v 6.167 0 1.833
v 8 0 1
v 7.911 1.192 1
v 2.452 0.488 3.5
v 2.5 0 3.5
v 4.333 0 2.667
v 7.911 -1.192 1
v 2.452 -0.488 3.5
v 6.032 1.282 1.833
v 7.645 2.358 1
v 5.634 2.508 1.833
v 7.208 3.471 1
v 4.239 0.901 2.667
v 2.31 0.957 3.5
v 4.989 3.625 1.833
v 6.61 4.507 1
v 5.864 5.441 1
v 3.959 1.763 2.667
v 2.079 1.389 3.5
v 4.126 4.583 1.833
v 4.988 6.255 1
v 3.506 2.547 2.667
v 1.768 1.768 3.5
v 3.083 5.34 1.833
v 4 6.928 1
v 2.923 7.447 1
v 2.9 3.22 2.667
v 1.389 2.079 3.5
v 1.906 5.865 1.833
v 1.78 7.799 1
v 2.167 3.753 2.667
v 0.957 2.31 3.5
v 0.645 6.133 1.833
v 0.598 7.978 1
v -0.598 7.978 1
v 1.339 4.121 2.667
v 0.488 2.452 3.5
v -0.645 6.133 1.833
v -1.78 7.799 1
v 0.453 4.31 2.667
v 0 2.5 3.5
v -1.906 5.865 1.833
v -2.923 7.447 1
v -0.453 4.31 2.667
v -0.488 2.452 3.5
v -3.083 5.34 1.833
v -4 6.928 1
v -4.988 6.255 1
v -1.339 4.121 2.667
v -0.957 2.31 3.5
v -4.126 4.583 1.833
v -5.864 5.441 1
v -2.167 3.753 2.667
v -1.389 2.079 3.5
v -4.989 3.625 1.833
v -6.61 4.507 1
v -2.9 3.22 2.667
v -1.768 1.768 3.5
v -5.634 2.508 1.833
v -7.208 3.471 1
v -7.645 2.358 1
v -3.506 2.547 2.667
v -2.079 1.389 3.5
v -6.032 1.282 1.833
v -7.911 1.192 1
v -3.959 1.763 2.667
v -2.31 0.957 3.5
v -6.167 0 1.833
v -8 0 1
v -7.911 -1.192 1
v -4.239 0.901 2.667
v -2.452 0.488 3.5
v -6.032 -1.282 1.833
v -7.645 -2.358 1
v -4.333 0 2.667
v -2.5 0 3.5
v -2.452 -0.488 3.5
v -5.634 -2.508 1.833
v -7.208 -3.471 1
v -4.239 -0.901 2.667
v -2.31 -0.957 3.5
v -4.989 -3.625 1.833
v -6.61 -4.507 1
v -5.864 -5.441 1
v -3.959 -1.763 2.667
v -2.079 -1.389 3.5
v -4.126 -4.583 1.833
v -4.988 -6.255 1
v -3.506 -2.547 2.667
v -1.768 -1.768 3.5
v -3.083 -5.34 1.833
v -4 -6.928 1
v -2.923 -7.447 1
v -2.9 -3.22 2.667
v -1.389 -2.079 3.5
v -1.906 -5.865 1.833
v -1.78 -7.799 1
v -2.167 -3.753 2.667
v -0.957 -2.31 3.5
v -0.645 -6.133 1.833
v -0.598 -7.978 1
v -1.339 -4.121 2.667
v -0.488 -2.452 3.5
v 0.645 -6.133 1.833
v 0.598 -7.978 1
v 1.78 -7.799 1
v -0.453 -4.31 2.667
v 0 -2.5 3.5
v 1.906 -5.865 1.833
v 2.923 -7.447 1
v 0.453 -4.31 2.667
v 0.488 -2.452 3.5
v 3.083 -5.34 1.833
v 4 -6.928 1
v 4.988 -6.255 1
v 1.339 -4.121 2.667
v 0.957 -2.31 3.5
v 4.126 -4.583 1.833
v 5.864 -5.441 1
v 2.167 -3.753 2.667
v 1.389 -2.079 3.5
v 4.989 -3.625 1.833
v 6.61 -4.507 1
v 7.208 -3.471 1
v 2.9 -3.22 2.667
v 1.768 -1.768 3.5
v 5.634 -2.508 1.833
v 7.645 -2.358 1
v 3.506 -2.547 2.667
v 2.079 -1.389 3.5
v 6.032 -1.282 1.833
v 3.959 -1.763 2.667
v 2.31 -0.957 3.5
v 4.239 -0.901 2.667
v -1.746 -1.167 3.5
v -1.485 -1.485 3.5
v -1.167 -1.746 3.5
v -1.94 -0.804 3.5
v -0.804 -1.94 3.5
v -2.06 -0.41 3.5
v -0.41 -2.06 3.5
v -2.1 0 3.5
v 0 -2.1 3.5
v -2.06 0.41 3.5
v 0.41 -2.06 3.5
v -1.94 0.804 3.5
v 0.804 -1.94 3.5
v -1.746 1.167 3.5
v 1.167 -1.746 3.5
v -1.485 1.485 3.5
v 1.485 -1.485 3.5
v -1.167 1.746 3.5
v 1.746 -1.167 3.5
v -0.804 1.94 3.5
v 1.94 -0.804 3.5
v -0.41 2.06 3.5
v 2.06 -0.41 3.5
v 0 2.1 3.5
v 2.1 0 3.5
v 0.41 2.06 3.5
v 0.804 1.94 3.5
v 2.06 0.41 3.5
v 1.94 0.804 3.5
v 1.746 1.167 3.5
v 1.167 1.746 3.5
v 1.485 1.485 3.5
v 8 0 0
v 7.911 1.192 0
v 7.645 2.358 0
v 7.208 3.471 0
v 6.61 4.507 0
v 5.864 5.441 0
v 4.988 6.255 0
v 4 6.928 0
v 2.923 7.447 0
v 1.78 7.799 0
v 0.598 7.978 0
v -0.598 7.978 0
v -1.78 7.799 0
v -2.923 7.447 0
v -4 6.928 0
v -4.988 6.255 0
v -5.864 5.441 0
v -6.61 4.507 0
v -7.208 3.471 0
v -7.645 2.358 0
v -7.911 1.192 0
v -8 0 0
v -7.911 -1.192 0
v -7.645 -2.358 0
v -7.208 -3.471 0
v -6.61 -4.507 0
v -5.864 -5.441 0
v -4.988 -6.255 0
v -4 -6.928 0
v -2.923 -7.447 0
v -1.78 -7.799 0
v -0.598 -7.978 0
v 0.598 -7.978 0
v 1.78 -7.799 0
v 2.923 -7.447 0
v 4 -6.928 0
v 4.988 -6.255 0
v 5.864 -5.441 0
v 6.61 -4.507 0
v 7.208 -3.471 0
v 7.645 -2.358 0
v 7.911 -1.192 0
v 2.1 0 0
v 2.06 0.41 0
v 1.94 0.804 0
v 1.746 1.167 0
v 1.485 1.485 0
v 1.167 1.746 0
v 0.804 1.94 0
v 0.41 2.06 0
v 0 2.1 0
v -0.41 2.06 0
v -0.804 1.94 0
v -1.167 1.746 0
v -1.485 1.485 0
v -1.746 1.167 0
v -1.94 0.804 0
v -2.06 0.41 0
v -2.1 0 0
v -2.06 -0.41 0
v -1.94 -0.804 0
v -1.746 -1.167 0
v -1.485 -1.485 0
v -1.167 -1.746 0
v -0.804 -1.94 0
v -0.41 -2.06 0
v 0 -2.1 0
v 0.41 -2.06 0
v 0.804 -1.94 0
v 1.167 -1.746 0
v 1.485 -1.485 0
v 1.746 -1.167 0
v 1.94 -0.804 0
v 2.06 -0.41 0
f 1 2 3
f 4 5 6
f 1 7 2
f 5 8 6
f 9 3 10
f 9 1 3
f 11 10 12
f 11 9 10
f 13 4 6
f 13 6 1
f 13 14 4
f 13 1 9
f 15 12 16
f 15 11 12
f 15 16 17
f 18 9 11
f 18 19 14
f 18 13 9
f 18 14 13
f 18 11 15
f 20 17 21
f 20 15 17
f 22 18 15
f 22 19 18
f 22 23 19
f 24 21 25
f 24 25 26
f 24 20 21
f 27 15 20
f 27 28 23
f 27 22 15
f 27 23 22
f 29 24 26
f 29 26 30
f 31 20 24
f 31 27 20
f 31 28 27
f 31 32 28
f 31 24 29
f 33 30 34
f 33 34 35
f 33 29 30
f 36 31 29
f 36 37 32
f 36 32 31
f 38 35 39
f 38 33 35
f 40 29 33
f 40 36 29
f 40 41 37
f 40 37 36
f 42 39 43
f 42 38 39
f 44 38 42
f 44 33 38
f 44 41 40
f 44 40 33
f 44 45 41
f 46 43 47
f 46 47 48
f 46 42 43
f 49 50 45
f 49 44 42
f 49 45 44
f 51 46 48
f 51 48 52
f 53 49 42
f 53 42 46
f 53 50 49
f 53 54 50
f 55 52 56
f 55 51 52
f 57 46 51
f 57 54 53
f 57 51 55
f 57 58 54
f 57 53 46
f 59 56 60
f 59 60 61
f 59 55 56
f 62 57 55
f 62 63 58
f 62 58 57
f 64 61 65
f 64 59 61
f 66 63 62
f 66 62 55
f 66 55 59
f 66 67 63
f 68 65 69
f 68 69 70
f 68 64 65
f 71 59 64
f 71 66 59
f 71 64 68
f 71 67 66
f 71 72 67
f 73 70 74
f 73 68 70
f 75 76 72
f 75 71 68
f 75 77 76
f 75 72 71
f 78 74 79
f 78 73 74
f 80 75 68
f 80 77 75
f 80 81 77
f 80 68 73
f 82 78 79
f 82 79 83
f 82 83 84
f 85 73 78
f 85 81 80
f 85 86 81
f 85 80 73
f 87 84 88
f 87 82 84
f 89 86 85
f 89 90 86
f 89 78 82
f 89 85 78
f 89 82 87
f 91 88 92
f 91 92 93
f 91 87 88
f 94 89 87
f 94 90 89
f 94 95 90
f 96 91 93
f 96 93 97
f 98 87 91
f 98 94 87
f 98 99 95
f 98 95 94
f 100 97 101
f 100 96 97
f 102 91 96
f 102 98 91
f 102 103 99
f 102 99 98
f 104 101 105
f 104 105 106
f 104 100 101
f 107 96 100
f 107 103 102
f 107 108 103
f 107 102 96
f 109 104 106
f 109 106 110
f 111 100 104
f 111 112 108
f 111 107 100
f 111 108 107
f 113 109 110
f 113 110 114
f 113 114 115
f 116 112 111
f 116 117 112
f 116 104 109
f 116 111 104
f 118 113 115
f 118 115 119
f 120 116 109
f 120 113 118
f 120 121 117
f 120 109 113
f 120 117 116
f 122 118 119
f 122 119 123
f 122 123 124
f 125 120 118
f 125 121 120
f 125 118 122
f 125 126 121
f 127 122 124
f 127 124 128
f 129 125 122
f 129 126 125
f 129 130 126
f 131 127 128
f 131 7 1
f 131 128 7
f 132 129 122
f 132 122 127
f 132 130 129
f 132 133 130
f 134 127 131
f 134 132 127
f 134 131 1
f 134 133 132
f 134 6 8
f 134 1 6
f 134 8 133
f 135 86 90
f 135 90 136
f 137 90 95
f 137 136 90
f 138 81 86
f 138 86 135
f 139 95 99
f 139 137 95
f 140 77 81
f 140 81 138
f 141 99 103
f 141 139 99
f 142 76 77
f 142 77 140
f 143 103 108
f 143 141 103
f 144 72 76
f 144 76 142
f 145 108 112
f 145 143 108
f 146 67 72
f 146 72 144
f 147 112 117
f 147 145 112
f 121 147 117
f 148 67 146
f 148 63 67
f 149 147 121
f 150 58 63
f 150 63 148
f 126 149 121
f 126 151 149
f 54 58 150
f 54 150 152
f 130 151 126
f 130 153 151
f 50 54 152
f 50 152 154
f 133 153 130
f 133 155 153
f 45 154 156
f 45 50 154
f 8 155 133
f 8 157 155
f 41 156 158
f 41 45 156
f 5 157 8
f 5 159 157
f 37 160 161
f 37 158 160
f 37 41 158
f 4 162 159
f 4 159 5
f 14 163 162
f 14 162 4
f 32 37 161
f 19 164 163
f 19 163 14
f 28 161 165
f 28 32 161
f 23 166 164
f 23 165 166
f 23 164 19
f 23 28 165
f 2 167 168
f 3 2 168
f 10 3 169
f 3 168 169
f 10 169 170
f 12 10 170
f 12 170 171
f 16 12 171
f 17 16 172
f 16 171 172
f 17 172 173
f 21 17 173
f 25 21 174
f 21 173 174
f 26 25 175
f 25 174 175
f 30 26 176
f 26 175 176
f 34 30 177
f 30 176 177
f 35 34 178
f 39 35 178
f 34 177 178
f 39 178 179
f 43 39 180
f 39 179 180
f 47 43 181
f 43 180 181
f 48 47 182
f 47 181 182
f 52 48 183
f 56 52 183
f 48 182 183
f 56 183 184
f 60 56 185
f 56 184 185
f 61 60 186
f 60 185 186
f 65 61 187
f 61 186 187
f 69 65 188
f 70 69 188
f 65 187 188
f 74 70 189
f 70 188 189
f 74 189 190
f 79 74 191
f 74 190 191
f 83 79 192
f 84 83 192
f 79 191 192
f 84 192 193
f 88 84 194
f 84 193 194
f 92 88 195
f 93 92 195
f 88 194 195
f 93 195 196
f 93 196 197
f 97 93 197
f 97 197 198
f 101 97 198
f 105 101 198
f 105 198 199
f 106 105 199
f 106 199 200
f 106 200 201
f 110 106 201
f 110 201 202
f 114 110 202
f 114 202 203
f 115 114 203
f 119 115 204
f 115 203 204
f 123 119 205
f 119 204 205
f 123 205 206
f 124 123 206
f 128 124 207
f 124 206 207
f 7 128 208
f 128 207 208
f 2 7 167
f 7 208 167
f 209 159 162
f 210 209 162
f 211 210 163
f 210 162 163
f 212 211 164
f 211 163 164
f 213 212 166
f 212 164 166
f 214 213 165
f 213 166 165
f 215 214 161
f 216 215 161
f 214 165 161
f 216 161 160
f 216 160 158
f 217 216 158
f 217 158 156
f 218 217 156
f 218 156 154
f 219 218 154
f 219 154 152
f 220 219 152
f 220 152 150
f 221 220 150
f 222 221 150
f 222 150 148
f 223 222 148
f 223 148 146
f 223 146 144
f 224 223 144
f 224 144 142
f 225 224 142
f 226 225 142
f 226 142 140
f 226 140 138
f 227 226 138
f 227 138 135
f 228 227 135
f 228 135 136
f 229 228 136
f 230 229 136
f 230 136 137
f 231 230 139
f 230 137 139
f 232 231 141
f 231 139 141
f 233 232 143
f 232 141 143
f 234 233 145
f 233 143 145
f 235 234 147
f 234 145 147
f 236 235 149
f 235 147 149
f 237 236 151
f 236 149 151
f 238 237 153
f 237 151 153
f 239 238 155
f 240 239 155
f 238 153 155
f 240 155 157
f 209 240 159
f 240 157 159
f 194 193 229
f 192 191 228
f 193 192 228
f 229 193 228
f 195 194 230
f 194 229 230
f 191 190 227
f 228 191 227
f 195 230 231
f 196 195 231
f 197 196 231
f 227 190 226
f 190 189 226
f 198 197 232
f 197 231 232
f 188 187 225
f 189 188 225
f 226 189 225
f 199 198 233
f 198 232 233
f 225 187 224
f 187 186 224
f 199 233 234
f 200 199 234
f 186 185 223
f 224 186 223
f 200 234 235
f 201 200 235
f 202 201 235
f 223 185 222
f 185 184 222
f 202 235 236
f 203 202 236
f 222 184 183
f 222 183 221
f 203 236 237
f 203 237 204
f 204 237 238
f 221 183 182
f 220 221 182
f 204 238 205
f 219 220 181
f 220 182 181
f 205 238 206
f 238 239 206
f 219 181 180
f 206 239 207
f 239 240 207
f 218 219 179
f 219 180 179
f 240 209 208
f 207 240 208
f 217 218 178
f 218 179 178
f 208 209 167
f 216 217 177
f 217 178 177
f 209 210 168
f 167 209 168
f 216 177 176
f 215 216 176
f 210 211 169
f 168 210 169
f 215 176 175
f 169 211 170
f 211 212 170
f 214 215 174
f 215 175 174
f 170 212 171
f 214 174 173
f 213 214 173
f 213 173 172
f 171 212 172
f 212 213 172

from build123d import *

# Parameters (mm, degrees)
SKETCH1_R                   = 8
BOSS_EXTRUDE1_DEPTH         = 3.5
CHAMFER1_SIZE               = 2.5
CHAMFER1_SIZE2              = 5.5
TAP_DRILL_FOR_M5X0_8_TAP1_D = 4.2


with BuildPart() as part:
    # Sketch1 → Boss-Extrude1 (new body)
    with BuildSketch(Plane.XY):
        Circle(SKETCH1_R)
    extrude(amount=BOSS_EXTRUDE1_DEPTH)

    # Chamfer1
    chamfer1_edges = [part.edges().sort_by_distance(p)[0] for p in [
        (-8, 0, 3.5),
    ]]
    chamfer1_side = [part.faces().sort_by_distance(p)[0] for p in [
        (-8, 0, 1.75),
    ]]
    chamfer(chamfer1_edges, length=CHAMFER1_SIZE, length2=CHAMFER1_SIZE2, reference=chamfer1_side[0])

    # Tap Drill for M5x0.8 Tap1 (through all)
    with Locations(Plane(origin=(0, 0, 0), x_dir=(-1, 0, 0), z_dir=(0, 0, -1))):
        with Locations((0, 0)):
            Hole(TAP_DRILL_FOR_M5X0_8_TAP1_D / 2)


solid = part.part
